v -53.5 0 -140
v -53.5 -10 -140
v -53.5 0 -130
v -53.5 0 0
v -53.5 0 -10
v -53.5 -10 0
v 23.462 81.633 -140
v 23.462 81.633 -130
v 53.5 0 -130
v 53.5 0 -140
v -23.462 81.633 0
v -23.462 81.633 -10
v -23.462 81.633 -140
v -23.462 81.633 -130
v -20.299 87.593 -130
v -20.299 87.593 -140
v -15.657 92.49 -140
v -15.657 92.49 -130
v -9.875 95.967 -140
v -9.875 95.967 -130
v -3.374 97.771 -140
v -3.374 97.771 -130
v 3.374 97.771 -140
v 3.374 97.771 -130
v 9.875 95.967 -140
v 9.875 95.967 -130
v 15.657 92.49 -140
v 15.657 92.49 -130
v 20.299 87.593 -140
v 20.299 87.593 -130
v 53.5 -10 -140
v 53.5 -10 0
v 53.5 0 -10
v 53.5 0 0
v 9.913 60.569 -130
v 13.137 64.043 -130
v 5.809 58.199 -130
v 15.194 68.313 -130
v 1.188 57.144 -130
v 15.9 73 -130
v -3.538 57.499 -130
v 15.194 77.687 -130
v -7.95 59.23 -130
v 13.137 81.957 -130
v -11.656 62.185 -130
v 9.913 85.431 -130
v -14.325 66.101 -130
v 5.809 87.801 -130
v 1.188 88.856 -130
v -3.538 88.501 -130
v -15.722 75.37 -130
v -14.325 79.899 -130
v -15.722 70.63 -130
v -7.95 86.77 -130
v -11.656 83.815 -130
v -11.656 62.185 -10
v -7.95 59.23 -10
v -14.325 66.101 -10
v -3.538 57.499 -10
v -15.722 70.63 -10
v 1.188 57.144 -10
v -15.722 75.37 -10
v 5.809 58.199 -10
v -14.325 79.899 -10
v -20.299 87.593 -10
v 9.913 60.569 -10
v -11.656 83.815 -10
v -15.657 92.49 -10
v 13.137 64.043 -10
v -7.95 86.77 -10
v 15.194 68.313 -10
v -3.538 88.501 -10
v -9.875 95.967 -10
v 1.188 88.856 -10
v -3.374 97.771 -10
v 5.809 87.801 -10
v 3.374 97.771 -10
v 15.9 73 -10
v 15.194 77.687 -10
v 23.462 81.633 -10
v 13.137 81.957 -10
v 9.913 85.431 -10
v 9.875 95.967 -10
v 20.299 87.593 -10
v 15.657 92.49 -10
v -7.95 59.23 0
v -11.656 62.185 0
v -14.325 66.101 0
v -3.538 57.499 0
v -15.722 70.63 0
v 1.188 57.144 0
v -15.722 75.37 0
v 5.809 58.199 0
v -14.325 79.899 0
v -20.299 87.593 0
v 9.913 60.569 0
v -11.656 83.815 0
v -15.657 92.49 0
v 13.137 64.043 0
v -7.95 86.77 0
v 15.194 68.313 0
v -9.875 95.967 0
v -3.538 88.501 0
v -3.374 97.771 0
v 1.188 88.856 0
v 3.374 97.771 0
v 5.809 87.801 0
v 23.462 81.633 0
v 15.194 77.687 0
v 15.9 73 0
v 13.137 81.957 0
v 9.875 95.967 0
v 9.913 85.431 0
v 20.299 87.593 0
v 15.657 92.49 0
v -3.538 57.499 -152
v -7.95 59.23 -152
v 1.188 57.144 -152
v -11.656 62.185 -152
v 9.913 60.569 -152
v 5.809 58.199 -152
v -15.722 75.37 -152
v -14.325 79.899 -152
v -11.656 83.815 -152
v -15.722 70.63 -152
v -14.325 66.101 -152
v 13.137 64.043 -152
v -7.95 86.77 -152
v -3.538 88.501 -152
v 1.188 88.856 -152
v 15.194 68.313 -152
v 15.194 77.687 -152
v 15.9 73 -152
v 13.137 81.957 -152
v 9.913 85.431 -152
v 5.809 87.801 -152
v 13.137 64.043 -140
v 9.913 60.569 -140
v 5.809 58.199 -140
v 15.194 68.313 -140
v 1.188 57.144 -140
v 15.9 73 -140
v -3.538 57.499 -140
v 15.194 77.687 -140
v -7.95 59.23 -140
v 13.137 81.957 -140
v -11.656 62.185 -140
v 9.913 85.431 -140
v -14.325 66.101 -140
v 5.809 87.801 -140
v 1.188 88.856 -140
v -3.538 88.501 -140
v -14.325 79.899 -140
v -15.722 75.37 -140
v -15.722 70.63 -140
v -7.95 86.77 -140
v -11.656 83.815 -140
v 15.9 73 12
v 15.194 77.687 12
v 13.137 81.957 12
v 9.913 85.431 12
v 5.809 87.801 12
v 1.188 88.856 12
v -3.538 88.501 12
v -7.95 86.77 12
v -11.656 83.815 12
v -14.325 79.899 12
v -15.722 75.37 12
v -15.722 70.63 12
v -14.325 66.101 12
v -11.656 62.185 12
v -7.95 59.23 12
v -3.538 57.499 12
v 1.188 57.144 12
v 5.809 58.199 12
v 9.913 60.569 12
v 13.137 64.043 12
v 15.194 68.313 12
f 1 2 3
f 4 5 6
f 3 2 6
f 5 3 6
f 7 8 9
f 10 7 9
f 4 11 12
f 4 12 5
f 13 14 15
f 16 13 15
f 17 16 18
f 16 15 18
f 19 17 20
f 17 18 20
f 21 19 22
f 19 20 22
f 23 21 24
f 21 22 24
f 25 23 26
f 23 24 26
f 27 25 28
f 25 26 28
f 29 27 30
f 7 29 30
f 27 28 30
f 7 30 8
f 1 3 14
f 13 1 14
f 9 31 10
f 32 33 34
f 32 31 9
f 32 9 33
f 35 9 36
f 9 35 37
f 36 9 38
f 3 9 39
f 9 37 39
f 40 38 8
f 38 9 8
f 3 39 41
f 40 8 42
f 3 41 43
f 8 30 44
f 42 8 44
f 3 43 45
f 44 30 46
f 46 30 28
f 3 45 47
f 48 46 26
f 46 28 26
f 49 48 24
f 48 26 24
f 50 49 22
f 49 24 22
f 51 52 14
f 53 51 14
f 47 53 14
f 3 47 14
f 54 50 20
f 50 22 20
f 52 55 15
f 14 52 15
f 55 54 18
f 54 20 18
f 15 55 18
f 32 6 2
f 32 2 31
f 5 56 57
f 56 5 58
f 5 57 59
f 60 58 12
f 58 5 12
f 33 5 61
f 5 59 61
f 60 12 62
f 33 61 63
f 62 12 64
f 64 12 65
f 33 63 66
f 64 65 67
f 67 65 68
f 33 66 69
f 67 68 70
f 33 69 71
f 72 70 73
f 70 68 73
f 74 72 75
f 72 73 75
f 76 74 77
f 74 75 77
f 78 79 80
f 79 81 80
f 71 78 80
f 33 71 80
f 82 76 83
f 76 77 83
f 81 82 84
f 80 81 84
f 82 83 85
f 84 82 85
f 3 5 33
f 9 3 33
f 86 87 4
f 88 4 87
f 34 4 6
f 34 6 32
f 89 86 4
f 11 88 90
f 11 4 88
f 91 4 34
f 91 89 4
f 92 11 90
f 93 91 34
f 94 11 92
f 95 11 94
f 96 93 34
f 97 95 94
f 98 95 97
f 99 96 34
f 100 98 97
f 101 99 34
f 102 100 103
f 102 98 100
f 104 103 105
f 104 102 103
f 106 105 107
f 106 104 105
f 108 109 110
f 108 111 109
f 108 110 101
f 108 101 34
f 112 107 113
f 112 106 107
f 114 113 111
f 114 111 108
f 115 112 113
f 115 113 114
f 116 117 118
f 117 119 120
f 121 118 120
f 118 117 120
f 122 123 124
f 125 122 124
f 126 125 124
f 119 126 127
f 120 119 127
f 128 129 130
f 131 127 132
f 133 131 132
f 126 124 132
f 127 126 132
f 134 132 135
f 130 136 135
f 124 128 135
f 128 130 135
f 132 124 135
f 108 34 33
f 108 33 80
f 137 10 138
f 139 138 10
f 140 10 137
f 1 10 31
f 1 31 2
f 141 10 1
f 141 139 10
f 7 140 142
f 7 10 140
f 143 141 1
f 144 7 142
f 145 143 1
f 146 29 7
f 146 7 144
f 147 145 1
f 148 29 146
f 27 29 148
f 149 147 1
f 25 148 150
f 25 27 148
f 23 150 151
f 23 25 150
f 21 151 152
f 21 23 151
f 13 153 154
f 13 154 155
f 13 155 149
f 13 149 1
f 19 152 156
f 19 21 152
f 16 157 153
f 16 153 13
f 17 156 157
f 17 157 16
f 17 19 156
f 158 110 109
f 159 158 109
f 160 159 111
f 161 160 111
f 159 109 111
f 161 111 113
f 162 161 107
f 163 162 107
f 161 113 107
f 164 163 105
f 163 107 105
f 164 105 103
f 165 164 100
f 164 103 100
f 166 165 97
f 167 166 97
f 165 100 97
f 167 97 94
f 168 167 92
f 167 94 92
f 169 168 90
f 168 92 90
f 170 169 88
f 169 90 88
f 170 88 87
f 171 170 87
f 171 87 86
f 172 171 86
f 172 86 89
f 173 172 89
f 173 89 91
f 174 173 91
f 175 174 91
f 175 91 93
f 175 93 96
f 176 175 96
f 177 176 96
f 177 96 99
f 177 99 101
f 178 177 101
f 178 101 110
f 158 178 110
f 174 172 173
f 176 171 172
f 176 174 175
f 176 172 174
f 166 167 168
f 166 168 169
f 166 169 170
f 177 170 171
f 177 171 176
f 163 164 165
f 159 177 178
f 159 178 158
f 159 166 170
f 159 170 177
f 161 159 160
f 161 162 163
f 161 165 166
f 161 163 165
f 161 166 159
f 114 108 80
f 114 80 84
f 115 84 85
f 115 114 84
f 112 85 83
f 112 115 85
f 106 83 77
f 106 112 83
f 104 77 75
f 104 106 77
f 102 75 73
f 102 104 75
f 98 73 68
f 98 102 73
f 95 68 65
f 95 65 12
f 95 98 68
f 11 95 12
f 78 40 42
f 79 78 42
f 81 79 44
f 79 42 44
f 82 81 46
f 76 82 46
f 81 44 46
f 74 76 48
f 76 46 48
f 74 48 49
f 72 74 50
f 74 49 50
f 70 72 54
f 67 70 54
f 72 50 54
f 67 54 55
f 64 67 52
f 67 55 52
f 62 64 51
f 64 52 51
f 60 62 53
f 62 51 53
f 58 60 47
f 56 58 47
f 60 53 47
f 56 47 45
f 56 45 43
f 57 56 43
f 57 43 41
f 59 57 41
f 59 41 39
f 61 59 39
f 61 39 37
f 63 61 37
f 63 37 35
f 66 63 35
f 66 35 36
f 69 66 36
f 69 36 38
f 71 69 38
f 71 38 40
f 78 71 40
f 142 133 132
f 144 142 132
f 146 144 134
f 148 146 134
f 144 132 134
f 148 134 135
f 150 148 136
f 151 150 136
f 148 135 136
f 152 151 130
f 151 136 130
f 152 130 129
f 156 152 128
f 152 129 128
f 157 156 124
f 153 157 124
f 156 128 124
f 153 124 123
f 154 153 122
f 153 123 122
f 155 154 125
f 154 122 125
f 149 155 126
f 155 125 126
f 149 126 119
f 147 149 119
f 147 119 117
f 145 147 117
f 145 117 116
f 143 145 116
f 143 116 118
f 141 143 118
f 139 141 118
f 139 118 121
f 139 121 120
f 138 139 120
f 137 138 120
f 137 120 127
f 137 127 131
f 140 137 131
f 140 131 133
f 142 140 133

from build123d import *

# Parameters (mm, degrees)
EXTRUDE_1_DEPTH      = 12
EXTRUDE_1_DEPTH_BACK = 152
SKETCH_1_R           = 15.9
SKETCH_1_3_R         = 15.9
EXTRUDE_2_DEPTH      = 10
EXTRUDE_START        = 10
SKETCH_2_R           = 15.9
EXTRUDE_3_DEPTH      = 10
SKETCH_3_W           = 107
SKETCH_3_H           = 120
EXTRUDE_4_DEPTH      = 10


with BuildPart() as part:
    # 草图1 → 凸台-拉伸1 (new, two sides: drawn at the far end of the back side and taken through both)
    with BuildSketch(Plane.XY.offset(-EXTRUDE_1_DEPTH_BACK)):
        with Locations((0, 73)):
            Circle(SKETCH_1_R)
    extrude(amount=EXTRUDE_1_DEPTH + EXTRUDE_1_DEPTH_BACK)

    # 草图1<3> → 凸台-拉伸2 (add)
    with BuildSketch(Plane.XY):
        with BuildLine():
            Line((-53.5, 0), (-53.5, -10))
            Line((-53.5, -10), (53.5, -10))
            Line((53.5, -10), (53.5, 0))
            Line((53.5, 0), (23.462066716, 81.633158484))
            ThreePointArc((23.462066716, 81.633158484), (0, 98), (-23.462066716, 81.633158484))
            Line((-23.462066716, 81.633158484), (-53.5, 0))
        make_face()
        with Locations((0, 73)):
            Circle(SKETCH_1_3_R, mode=Mode.SUBTRACT)
    extrude(amount=-EXTRUDE_2_DEPTH)

    # 草图2 → 凸台-拉伸3 (add)
    with BuildSketch(Plane.XY.offset(-140).offset(EXTRUDE_START)):
        with BuildLine():
            Line((-53.5, 0), (-23.462066716, 81.633158484))
            ThreePointArc((-23.462066716, 81.633158484), (0, 98), (23.462066716, 81.633158484))
            Line((23.462066716, 81.633158484), (53.5, 0))
            Line((53.5, 0), (53.5, -10))
            Line((53.5, -10), (-53.5, -10))
            Line((-53.5, -10), (-53.5, 0))
        make_face()
        with Locations((0, 73)):
            Circle(SKETCH_2_R, mode=Mode.SUBTRACT)
    extrude(amount=-EXTRUDE_3_DEPTH)

    # 草图3 → 凸台-拉伸4 (add)
    with BuildSketch(Plane.XZ.offset(10)):
        with Locations((0, -70)):
            Rectangle(SKETCH_3_W, SKETCH_3_H)
    extrude(amount=-EXTRUDE_4_DEPTH)


solid = part.part
